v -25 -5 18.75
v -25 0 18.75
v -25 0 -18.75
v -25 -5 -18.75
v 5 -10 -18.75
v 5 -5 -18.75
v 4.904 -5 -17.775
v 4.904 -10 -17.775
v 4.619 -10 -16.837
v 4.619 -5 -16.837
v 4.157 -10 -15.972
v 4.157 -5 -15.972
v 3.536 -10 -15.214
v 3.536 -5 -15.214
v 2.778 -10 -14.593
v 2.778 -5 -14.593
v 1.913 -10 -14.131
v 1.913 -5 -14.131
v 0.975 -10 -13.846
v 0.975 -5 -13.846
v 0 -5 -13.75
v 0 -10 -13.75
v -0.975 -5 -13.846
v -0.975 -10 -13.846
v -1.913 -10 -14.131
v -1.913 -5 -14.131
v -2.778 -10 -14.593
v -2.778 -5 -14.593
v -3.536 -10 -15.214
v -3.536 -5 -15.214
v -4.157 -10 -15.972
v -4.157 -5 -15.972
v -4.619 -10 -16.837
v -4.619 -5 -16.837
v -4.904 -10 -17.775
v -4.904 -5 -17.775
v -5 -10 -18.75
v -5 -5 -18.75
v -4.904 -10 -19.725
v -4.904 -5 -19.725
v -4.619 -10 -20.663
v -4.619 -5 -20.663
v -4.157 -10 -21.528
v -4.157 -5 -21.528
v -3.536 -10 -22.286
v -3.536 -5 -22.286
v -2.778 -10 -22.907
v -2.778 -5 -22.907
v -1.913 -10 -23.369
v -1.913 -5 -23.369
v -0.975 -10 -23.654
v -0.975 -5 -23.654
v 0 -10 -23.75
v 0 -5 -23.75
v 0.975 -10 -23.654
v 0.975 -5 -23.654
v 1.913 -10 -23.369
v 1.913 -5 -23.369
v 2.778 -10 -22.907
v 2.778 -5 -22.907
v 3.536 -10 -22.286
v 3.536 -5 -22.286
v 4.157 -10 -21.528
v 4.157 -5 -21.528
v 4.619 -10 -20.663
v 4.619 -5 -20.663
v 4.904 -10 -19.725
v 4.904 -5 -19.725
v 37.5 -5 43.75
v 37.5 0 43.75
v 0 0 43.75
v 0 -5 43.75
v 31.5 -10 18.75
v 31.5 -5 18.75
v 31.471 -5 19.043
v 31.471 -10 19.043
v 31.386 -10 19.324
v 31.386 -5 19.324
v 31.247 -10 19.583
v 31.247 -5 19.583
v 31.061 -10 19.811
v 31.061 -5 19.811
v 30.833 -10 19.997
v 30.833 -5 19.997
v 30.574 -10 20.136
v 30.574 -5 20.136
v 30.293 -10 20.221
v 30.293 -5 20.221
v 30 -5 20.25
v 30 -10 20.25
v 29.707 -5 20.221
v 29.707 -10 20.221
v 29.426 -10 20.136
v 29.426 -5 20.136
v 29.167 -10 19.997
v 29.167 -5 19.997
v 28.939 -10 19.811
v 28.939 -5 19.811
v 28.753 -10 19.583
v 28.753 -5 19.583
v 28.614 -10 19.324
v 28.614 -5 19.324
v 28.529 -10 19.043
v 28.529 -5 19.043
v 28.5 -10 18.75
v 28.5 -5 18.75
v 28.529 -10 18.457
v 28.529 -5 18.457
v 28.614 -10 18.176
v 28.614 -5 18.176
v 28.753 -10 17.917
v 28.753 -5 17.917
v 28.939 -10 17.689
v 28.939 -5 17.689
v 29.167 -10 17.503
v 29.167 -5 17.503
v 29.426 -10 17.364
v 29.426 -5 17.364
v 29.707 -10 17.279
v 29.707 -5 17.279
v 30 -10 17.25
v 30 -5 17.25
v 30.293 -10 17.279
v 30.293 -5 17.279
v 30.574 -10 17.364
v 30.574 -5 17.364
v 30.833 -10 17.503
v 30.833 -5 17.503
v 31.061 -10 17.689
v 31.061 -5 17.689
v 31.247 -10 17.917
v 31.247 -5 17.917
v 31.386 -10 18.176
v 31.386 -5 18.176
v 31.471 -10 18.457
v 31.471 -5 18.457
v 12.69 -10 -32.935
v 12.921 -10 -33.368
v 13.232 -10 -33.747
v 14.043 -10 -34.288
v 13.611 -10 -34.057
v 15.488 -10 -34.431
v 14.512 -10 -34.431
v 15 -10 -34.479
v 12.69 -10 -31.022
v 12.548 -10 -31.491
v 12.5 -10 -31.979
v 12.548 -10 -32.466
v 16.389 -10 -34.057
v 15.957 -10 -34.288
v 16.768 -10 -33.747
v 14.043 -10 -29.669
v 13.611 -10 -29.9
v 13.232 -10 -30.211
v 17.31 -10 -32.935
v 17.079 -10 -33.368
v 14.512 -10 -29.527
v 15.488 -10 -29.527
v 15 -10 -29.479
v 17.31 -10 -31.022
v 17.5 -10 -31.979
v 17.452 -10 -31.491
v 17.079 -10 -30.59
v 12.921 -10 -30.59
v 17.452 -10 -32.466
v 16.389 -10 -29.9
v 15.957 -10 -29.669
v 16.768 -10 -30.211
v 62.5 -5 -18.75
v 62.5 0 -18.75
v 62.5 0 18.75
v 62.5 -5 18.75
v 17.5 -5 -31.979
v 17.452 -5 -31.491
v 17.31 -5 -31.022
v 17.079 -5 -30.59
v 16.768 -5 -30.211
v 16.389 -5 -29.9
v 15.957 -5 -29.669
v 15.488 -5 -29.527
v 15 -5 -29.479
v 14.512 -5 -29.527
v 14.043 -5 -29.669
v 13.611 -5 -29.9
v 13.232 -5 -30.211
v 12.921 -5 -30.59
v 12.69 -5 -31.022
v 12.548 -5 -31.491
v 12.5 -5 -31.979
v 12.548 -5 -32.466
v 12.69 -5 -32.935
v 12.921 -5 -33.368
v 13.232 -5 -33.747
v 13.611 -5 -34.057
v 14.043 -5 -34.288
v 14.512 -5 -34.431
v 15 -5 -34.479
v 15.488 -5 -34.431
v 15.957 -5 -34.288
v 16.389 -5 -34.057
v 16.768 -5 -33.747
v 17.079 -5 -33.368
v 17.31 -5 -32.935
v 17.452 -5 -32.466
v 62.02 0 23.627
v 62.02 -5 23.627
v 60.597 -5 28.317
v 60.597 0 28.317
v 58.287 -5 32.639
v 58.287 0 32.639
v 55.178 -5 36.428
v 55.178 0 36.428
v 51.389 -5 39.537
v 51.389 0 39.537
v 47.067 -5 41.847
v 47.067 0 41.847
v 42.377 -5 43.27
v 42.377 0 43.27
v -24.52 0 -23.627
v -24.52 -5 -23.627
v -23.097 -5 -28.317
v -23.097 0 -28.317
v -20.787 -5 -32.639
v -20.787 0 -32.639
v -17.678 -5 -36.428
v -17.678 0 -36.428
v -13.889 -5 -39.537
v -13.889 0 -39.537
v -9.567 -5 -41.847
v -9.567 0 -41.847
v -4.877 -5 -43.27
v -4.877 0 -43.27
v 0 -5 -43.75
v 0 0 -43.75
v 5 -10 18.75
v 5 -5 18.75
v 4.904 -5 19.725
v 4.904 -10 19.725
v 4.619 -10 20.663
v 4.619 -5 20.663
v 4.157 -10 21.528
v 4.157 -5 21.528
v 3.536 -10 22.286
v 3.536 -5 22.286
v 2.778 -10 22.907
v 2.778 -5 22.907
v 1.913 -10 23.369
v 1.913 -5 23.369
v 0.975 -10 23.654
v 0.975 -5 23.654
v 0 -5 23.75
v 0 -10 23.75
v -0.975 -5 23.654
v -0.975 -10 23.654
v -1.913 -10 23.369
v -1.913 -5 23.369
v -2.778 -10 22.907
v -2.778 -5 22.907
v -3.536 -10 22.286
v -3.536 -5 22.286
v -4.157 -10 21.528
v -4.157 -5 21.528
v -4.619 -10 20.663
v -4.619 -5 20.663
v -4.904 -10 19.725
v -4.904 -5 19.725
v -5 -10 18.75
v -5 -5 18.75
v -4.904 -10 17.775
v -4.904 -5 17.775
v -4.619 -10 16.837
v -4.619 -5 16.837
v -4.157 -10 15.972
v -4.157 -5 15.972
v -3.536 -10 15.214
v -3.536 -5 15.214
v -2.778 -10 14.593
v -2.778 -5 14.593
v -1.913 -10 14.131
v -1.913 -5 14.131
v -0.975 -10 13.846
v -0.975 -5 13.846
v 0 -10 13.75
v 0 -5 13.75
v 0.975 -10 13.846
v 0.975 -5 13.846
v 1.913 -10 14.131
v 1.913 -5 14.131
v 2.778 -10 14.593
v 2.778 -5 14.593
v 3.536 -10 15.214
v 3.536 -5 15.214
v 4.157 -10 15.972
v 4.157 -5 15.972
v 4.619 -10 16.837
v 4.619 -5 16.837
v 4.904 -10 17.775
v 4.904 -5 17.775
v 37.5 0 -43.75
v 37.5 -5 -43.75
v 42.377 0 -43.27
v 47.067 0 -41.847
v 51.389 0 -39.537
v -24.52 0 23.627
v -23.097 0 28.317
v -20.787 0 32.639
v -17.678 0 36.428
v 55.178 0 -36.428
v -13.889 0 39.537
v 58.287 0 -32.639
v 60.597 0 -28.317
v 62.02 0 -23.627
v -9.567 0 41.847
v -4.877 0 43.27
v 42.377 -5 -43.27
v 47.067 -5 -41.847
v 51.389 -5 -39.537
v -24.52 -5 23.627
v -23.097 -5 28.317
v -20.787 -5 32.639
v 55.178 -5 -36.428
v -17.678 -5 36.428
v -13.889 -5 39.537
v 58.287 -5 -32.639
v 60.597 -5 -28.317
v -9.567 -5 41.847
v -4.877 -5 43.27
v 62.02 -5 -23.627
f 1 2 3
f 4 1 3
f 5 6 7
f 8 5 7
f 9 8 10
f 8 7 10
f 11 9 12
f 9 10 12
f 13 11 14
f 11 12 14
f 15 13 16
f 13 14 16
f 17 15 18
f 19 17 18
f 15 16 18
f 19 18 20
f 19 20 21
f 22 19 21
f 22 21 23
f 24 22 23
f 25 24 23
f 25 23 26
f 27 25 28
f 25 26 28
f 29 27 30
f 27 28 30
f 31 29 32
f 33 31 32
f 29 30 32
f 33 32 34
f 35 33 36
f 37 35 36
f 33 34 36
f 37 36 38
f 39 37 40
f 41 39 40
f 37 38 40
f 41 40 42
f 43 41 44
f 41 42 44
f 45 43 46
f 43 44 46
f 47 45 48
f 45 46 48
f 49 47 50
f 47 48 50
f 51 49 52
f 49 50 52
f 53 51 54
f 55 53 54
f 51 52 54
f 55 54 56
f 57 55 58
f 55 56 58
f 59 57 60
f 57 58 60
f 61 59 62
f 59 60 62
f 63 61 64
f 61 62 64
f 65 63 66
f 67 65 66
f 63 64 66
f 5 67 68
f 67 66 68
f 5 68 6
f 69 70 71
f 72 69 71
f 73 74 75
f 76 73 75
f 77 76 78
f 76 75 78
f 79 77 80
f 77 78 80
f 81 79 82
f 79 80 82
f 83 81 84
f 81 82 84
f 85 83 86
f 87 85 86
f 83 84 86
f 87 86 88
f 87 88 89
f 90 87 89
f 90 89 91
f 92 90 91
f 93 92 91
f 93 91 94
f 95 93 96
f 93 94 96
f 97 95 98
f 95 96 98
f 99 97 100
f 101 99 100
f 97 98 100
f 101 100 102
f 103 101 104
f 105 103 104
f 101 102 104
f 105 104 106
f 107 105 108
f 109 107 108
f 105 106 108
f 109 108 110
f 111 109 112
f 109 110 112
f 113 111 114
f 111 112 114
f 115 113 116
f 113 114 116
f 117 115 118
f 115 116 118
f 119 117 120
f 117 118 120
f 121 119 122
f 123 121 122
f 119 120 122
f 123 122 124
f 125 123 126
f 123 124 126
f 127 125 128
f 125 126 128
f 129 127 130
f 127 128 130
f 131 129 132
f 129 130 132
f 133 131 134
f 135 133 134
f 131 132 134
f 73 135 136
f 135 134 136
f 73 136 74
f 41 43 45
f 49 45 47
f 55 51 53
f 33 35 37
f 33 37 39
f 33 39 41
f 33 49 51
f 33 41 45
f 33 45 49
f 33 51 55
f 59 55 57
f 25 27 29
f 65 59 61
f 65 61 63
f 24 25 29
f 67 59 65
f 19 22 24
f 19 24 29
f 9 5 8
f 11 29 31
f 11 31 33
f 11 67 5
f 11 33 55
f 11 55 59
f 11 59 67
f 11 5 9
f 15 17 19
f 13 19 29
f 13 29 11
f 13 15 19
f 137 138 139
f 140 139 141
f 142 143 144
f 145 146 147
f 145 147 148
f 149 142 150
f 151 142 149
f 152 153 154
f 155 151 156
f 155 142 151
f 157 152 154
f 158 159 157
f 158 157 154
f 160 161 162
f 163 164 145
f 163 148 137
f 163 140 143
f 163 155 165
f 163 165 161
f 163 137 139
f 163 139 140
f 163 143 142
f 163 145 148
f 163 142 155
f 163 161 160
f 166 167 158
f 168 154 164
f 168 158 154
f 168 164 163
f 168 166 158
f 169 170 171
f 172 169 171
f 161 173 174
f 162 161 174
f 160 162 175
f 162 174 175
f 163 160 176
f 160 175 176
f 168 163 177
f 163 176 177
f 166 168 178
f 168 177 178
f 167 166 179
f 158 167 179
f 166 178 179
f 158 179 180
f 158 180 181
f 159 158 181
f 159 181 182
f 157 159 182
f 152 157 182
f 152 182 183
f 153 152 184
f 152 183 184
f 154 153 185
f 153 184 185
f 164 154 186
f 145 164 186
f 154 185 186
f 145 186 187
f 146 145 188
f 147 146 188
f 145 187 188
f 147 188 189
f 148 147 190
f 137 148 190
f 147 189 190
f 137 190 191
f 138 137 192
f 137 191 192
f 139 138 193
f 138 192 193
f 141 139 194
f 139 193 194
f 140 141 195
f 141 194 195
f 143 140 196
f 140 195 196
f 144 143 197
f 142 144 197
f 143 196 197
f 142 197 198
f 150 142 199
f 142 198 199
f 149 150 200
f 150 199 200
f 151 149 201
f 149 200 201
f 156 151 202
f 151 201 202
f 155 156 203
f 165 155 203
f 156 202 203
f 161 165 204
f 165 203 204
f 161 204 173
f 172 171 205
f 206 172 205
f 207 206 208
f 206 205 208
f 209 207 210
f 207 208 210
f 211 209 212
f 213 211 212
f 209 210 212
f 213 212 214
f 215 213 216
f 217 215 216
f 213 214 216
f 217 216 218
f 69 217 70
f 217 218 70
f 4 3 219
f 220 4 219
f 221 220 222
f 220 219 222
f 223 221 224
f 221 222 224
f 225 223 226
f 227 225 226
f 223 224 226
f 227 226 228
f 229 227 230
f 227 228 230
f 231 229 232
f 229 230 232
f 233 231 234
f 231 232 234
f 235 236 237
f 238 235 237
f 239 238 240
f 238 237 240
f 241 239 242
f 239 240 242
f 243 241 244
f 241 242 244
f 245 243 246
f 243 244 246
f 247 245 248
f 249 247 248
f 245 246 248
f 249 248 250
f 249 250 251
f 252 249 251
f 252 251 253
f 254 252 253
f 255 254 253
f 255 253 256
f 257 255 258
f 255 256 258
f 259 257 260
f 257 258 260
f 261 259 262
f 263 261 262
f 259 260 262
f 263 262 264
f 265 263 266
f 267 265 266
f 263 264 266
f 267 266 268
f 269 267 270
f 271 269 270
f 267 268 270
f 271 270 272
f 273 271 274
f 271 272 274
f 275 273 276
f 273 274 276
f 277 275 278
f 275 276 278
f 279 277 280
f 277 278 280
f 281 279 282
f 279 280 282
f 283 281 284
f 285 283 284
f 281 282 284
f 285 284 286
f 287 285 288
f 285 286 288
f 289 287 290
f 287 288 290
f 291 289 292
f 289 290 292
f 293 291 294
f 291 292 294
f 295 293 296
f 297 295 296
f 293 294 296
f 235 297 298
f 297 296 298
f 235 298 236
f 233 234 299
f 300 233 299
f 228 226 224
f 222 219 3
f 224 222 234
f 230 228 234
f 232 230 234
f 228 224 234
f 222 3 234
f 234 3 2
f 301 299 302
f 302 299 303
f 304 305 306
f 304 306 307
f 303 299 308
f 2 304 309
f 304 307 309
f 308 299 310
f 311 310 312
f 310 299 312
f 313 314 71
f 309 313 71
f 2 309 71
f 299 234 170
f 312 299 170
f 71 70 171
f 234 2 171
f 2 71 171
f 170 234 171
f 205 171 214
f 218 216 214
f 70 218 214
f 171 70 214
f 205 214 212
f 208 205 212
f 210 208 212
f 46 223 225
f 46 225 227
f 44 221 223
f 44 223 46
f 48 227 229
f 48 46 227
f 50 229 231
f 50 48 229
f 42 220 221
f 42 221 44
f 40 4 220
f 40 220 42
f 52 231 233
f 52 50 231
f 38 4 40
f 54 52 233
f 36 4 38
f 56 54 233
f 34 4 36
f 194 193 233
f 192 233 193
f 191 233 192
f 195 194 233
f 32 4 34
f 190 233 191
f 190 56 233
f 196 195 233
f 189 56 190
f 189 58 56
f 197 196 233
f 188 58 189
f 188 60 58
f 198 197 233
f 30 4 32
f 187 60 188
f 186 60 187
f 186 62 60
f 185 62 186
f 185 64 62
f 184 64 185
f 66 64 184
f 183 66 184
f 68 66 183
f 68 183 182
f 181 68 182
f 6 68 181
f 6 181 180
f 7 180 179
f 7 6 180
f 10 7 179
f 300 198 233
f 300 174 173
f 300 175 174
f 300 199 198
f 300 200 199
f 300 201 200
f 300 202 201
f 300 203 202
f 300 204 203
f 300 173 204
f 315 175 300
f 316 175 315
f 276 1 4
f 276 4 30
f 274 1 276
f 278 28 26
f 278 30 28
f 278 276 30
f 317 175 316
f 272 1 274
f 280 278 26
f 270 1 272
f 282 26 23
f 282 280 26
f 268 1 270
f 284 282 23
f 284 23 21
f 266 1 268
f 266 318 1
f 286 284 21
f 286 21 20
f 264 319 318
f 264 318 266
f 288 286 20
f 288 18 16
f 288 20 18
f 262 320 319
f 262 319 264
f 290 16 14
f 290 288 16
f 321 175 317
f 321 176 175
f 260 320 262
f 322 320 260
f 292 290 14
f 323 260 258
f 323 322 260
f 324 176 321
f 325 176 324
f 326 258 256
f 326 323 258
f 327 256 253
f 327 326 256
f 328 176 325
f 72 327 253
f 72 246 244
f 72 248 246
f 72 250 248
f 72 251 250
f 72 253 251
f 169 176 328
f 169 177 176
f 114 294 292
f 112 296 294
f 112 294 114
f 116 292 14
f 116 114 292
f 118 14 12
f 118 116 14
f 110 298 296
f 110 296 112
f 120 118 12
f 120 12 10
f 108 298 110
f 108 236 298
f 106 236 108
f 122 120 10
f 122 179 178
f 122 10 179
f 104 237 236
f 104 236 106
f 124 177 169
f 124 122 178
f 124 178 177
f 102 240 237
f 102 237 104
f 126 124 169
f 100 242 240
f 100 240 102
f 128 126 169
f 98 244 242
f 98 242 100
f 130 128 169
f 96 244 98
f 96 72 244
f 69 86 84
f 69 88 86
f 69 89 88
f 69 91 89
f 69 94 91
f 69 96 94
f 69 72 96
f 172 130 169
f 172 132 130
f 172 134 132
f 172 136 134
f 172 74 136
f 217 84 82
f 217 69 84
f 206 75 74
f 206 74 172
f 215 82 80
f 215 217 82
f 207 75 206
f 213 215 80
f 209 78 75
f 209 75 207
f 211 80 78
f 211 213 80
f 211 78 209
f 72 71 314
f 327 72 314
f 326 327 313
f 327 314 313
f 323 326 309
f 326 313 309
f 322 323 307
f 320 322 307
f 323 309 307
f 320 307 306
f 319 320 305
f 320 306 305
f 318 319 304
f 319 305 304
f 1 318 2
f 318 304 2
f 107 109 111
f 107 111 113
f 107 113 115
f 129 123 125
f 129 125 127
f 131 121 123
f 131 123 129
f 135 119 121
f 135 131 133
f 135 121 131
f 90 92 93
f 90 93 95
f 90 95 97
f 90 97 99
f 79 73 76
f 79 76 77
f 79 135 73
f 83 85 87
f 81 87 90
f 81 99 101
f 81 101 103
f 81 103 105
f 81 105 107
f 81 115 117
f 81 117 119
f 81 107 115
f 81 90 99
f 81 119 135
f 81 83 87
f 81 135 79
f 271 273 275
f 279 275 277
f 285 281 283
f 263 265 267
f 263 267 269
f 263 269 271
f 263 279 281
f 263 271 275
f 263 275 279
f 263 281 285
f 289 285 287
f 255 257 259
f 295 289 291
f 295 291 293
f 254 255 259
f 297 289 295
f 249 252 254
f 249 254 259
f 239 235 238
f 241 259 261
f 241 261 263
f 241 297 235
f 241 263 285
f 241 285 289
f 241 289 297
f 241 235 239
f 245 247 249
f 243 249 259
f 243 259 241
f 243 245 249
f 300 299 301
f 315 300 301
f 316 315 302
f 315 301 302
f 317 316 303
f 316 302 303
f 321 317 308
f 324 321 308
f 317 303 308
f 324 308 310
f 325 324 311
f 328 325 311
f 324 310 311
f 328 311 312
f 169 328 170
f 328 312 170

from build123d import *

# Parameters (mm, degrees)
F1_DEPTH = 5
F2_R     = 5
F2_R_2   = 2.5
F3_DEPTH = 5
F4_R     = 1.5
F5_DEPTH = 5


with BuildPart() as f1:
    # F0 (on Front) → F1 (new body)
    with BuildSketch(Plane.XZ):
        with BuildLine():
            ThreePointArc((0, 43.75), (-17.67767, 36.42767), (-25, 18.75))
            Line((-25, 18.75), (-25, -18.75))
            ThreePointArc((-25, -18.75), (-17.67767, -36.42767), (0, -43.75))
            Line((0, -43.75), (37.5, -43.75))
            ThreePointArc((37.5, -43.75), (55.17767, -36.42767), (62.5, -18.75))
            Line((62.5, -18.75), (62.5, 18.75))
            ThreePointArc((62.5, 18.75), (55.17767, 36.42767), (37.5, 43.75))
            Line((37.5, 43.75), (0, 43.75))
        make_face()
    extrude(amount=F1_DEPTH)

    # F2 (on face) → F3 (join)
    with BuildSketch(Plane.XZ.offset(5)):
        with Locations((0, 18.75)):
            Circle(F2_R)
        with Locations((0, -18.75)):
            Circle(F2_R)
        with Locations((15, -31.978757)):
            Circle(F2_R_2)
    extrude(amount=F3_DEPTH)

    # F4 (on face) → F5 (join)
    with BuildSketch(Plane.XZ.offset(5)):
        with Locations((30, 18.75)):
            Circle(F4_R)
    extrude(amount=F5_DEPTH)


solid = f1.part
